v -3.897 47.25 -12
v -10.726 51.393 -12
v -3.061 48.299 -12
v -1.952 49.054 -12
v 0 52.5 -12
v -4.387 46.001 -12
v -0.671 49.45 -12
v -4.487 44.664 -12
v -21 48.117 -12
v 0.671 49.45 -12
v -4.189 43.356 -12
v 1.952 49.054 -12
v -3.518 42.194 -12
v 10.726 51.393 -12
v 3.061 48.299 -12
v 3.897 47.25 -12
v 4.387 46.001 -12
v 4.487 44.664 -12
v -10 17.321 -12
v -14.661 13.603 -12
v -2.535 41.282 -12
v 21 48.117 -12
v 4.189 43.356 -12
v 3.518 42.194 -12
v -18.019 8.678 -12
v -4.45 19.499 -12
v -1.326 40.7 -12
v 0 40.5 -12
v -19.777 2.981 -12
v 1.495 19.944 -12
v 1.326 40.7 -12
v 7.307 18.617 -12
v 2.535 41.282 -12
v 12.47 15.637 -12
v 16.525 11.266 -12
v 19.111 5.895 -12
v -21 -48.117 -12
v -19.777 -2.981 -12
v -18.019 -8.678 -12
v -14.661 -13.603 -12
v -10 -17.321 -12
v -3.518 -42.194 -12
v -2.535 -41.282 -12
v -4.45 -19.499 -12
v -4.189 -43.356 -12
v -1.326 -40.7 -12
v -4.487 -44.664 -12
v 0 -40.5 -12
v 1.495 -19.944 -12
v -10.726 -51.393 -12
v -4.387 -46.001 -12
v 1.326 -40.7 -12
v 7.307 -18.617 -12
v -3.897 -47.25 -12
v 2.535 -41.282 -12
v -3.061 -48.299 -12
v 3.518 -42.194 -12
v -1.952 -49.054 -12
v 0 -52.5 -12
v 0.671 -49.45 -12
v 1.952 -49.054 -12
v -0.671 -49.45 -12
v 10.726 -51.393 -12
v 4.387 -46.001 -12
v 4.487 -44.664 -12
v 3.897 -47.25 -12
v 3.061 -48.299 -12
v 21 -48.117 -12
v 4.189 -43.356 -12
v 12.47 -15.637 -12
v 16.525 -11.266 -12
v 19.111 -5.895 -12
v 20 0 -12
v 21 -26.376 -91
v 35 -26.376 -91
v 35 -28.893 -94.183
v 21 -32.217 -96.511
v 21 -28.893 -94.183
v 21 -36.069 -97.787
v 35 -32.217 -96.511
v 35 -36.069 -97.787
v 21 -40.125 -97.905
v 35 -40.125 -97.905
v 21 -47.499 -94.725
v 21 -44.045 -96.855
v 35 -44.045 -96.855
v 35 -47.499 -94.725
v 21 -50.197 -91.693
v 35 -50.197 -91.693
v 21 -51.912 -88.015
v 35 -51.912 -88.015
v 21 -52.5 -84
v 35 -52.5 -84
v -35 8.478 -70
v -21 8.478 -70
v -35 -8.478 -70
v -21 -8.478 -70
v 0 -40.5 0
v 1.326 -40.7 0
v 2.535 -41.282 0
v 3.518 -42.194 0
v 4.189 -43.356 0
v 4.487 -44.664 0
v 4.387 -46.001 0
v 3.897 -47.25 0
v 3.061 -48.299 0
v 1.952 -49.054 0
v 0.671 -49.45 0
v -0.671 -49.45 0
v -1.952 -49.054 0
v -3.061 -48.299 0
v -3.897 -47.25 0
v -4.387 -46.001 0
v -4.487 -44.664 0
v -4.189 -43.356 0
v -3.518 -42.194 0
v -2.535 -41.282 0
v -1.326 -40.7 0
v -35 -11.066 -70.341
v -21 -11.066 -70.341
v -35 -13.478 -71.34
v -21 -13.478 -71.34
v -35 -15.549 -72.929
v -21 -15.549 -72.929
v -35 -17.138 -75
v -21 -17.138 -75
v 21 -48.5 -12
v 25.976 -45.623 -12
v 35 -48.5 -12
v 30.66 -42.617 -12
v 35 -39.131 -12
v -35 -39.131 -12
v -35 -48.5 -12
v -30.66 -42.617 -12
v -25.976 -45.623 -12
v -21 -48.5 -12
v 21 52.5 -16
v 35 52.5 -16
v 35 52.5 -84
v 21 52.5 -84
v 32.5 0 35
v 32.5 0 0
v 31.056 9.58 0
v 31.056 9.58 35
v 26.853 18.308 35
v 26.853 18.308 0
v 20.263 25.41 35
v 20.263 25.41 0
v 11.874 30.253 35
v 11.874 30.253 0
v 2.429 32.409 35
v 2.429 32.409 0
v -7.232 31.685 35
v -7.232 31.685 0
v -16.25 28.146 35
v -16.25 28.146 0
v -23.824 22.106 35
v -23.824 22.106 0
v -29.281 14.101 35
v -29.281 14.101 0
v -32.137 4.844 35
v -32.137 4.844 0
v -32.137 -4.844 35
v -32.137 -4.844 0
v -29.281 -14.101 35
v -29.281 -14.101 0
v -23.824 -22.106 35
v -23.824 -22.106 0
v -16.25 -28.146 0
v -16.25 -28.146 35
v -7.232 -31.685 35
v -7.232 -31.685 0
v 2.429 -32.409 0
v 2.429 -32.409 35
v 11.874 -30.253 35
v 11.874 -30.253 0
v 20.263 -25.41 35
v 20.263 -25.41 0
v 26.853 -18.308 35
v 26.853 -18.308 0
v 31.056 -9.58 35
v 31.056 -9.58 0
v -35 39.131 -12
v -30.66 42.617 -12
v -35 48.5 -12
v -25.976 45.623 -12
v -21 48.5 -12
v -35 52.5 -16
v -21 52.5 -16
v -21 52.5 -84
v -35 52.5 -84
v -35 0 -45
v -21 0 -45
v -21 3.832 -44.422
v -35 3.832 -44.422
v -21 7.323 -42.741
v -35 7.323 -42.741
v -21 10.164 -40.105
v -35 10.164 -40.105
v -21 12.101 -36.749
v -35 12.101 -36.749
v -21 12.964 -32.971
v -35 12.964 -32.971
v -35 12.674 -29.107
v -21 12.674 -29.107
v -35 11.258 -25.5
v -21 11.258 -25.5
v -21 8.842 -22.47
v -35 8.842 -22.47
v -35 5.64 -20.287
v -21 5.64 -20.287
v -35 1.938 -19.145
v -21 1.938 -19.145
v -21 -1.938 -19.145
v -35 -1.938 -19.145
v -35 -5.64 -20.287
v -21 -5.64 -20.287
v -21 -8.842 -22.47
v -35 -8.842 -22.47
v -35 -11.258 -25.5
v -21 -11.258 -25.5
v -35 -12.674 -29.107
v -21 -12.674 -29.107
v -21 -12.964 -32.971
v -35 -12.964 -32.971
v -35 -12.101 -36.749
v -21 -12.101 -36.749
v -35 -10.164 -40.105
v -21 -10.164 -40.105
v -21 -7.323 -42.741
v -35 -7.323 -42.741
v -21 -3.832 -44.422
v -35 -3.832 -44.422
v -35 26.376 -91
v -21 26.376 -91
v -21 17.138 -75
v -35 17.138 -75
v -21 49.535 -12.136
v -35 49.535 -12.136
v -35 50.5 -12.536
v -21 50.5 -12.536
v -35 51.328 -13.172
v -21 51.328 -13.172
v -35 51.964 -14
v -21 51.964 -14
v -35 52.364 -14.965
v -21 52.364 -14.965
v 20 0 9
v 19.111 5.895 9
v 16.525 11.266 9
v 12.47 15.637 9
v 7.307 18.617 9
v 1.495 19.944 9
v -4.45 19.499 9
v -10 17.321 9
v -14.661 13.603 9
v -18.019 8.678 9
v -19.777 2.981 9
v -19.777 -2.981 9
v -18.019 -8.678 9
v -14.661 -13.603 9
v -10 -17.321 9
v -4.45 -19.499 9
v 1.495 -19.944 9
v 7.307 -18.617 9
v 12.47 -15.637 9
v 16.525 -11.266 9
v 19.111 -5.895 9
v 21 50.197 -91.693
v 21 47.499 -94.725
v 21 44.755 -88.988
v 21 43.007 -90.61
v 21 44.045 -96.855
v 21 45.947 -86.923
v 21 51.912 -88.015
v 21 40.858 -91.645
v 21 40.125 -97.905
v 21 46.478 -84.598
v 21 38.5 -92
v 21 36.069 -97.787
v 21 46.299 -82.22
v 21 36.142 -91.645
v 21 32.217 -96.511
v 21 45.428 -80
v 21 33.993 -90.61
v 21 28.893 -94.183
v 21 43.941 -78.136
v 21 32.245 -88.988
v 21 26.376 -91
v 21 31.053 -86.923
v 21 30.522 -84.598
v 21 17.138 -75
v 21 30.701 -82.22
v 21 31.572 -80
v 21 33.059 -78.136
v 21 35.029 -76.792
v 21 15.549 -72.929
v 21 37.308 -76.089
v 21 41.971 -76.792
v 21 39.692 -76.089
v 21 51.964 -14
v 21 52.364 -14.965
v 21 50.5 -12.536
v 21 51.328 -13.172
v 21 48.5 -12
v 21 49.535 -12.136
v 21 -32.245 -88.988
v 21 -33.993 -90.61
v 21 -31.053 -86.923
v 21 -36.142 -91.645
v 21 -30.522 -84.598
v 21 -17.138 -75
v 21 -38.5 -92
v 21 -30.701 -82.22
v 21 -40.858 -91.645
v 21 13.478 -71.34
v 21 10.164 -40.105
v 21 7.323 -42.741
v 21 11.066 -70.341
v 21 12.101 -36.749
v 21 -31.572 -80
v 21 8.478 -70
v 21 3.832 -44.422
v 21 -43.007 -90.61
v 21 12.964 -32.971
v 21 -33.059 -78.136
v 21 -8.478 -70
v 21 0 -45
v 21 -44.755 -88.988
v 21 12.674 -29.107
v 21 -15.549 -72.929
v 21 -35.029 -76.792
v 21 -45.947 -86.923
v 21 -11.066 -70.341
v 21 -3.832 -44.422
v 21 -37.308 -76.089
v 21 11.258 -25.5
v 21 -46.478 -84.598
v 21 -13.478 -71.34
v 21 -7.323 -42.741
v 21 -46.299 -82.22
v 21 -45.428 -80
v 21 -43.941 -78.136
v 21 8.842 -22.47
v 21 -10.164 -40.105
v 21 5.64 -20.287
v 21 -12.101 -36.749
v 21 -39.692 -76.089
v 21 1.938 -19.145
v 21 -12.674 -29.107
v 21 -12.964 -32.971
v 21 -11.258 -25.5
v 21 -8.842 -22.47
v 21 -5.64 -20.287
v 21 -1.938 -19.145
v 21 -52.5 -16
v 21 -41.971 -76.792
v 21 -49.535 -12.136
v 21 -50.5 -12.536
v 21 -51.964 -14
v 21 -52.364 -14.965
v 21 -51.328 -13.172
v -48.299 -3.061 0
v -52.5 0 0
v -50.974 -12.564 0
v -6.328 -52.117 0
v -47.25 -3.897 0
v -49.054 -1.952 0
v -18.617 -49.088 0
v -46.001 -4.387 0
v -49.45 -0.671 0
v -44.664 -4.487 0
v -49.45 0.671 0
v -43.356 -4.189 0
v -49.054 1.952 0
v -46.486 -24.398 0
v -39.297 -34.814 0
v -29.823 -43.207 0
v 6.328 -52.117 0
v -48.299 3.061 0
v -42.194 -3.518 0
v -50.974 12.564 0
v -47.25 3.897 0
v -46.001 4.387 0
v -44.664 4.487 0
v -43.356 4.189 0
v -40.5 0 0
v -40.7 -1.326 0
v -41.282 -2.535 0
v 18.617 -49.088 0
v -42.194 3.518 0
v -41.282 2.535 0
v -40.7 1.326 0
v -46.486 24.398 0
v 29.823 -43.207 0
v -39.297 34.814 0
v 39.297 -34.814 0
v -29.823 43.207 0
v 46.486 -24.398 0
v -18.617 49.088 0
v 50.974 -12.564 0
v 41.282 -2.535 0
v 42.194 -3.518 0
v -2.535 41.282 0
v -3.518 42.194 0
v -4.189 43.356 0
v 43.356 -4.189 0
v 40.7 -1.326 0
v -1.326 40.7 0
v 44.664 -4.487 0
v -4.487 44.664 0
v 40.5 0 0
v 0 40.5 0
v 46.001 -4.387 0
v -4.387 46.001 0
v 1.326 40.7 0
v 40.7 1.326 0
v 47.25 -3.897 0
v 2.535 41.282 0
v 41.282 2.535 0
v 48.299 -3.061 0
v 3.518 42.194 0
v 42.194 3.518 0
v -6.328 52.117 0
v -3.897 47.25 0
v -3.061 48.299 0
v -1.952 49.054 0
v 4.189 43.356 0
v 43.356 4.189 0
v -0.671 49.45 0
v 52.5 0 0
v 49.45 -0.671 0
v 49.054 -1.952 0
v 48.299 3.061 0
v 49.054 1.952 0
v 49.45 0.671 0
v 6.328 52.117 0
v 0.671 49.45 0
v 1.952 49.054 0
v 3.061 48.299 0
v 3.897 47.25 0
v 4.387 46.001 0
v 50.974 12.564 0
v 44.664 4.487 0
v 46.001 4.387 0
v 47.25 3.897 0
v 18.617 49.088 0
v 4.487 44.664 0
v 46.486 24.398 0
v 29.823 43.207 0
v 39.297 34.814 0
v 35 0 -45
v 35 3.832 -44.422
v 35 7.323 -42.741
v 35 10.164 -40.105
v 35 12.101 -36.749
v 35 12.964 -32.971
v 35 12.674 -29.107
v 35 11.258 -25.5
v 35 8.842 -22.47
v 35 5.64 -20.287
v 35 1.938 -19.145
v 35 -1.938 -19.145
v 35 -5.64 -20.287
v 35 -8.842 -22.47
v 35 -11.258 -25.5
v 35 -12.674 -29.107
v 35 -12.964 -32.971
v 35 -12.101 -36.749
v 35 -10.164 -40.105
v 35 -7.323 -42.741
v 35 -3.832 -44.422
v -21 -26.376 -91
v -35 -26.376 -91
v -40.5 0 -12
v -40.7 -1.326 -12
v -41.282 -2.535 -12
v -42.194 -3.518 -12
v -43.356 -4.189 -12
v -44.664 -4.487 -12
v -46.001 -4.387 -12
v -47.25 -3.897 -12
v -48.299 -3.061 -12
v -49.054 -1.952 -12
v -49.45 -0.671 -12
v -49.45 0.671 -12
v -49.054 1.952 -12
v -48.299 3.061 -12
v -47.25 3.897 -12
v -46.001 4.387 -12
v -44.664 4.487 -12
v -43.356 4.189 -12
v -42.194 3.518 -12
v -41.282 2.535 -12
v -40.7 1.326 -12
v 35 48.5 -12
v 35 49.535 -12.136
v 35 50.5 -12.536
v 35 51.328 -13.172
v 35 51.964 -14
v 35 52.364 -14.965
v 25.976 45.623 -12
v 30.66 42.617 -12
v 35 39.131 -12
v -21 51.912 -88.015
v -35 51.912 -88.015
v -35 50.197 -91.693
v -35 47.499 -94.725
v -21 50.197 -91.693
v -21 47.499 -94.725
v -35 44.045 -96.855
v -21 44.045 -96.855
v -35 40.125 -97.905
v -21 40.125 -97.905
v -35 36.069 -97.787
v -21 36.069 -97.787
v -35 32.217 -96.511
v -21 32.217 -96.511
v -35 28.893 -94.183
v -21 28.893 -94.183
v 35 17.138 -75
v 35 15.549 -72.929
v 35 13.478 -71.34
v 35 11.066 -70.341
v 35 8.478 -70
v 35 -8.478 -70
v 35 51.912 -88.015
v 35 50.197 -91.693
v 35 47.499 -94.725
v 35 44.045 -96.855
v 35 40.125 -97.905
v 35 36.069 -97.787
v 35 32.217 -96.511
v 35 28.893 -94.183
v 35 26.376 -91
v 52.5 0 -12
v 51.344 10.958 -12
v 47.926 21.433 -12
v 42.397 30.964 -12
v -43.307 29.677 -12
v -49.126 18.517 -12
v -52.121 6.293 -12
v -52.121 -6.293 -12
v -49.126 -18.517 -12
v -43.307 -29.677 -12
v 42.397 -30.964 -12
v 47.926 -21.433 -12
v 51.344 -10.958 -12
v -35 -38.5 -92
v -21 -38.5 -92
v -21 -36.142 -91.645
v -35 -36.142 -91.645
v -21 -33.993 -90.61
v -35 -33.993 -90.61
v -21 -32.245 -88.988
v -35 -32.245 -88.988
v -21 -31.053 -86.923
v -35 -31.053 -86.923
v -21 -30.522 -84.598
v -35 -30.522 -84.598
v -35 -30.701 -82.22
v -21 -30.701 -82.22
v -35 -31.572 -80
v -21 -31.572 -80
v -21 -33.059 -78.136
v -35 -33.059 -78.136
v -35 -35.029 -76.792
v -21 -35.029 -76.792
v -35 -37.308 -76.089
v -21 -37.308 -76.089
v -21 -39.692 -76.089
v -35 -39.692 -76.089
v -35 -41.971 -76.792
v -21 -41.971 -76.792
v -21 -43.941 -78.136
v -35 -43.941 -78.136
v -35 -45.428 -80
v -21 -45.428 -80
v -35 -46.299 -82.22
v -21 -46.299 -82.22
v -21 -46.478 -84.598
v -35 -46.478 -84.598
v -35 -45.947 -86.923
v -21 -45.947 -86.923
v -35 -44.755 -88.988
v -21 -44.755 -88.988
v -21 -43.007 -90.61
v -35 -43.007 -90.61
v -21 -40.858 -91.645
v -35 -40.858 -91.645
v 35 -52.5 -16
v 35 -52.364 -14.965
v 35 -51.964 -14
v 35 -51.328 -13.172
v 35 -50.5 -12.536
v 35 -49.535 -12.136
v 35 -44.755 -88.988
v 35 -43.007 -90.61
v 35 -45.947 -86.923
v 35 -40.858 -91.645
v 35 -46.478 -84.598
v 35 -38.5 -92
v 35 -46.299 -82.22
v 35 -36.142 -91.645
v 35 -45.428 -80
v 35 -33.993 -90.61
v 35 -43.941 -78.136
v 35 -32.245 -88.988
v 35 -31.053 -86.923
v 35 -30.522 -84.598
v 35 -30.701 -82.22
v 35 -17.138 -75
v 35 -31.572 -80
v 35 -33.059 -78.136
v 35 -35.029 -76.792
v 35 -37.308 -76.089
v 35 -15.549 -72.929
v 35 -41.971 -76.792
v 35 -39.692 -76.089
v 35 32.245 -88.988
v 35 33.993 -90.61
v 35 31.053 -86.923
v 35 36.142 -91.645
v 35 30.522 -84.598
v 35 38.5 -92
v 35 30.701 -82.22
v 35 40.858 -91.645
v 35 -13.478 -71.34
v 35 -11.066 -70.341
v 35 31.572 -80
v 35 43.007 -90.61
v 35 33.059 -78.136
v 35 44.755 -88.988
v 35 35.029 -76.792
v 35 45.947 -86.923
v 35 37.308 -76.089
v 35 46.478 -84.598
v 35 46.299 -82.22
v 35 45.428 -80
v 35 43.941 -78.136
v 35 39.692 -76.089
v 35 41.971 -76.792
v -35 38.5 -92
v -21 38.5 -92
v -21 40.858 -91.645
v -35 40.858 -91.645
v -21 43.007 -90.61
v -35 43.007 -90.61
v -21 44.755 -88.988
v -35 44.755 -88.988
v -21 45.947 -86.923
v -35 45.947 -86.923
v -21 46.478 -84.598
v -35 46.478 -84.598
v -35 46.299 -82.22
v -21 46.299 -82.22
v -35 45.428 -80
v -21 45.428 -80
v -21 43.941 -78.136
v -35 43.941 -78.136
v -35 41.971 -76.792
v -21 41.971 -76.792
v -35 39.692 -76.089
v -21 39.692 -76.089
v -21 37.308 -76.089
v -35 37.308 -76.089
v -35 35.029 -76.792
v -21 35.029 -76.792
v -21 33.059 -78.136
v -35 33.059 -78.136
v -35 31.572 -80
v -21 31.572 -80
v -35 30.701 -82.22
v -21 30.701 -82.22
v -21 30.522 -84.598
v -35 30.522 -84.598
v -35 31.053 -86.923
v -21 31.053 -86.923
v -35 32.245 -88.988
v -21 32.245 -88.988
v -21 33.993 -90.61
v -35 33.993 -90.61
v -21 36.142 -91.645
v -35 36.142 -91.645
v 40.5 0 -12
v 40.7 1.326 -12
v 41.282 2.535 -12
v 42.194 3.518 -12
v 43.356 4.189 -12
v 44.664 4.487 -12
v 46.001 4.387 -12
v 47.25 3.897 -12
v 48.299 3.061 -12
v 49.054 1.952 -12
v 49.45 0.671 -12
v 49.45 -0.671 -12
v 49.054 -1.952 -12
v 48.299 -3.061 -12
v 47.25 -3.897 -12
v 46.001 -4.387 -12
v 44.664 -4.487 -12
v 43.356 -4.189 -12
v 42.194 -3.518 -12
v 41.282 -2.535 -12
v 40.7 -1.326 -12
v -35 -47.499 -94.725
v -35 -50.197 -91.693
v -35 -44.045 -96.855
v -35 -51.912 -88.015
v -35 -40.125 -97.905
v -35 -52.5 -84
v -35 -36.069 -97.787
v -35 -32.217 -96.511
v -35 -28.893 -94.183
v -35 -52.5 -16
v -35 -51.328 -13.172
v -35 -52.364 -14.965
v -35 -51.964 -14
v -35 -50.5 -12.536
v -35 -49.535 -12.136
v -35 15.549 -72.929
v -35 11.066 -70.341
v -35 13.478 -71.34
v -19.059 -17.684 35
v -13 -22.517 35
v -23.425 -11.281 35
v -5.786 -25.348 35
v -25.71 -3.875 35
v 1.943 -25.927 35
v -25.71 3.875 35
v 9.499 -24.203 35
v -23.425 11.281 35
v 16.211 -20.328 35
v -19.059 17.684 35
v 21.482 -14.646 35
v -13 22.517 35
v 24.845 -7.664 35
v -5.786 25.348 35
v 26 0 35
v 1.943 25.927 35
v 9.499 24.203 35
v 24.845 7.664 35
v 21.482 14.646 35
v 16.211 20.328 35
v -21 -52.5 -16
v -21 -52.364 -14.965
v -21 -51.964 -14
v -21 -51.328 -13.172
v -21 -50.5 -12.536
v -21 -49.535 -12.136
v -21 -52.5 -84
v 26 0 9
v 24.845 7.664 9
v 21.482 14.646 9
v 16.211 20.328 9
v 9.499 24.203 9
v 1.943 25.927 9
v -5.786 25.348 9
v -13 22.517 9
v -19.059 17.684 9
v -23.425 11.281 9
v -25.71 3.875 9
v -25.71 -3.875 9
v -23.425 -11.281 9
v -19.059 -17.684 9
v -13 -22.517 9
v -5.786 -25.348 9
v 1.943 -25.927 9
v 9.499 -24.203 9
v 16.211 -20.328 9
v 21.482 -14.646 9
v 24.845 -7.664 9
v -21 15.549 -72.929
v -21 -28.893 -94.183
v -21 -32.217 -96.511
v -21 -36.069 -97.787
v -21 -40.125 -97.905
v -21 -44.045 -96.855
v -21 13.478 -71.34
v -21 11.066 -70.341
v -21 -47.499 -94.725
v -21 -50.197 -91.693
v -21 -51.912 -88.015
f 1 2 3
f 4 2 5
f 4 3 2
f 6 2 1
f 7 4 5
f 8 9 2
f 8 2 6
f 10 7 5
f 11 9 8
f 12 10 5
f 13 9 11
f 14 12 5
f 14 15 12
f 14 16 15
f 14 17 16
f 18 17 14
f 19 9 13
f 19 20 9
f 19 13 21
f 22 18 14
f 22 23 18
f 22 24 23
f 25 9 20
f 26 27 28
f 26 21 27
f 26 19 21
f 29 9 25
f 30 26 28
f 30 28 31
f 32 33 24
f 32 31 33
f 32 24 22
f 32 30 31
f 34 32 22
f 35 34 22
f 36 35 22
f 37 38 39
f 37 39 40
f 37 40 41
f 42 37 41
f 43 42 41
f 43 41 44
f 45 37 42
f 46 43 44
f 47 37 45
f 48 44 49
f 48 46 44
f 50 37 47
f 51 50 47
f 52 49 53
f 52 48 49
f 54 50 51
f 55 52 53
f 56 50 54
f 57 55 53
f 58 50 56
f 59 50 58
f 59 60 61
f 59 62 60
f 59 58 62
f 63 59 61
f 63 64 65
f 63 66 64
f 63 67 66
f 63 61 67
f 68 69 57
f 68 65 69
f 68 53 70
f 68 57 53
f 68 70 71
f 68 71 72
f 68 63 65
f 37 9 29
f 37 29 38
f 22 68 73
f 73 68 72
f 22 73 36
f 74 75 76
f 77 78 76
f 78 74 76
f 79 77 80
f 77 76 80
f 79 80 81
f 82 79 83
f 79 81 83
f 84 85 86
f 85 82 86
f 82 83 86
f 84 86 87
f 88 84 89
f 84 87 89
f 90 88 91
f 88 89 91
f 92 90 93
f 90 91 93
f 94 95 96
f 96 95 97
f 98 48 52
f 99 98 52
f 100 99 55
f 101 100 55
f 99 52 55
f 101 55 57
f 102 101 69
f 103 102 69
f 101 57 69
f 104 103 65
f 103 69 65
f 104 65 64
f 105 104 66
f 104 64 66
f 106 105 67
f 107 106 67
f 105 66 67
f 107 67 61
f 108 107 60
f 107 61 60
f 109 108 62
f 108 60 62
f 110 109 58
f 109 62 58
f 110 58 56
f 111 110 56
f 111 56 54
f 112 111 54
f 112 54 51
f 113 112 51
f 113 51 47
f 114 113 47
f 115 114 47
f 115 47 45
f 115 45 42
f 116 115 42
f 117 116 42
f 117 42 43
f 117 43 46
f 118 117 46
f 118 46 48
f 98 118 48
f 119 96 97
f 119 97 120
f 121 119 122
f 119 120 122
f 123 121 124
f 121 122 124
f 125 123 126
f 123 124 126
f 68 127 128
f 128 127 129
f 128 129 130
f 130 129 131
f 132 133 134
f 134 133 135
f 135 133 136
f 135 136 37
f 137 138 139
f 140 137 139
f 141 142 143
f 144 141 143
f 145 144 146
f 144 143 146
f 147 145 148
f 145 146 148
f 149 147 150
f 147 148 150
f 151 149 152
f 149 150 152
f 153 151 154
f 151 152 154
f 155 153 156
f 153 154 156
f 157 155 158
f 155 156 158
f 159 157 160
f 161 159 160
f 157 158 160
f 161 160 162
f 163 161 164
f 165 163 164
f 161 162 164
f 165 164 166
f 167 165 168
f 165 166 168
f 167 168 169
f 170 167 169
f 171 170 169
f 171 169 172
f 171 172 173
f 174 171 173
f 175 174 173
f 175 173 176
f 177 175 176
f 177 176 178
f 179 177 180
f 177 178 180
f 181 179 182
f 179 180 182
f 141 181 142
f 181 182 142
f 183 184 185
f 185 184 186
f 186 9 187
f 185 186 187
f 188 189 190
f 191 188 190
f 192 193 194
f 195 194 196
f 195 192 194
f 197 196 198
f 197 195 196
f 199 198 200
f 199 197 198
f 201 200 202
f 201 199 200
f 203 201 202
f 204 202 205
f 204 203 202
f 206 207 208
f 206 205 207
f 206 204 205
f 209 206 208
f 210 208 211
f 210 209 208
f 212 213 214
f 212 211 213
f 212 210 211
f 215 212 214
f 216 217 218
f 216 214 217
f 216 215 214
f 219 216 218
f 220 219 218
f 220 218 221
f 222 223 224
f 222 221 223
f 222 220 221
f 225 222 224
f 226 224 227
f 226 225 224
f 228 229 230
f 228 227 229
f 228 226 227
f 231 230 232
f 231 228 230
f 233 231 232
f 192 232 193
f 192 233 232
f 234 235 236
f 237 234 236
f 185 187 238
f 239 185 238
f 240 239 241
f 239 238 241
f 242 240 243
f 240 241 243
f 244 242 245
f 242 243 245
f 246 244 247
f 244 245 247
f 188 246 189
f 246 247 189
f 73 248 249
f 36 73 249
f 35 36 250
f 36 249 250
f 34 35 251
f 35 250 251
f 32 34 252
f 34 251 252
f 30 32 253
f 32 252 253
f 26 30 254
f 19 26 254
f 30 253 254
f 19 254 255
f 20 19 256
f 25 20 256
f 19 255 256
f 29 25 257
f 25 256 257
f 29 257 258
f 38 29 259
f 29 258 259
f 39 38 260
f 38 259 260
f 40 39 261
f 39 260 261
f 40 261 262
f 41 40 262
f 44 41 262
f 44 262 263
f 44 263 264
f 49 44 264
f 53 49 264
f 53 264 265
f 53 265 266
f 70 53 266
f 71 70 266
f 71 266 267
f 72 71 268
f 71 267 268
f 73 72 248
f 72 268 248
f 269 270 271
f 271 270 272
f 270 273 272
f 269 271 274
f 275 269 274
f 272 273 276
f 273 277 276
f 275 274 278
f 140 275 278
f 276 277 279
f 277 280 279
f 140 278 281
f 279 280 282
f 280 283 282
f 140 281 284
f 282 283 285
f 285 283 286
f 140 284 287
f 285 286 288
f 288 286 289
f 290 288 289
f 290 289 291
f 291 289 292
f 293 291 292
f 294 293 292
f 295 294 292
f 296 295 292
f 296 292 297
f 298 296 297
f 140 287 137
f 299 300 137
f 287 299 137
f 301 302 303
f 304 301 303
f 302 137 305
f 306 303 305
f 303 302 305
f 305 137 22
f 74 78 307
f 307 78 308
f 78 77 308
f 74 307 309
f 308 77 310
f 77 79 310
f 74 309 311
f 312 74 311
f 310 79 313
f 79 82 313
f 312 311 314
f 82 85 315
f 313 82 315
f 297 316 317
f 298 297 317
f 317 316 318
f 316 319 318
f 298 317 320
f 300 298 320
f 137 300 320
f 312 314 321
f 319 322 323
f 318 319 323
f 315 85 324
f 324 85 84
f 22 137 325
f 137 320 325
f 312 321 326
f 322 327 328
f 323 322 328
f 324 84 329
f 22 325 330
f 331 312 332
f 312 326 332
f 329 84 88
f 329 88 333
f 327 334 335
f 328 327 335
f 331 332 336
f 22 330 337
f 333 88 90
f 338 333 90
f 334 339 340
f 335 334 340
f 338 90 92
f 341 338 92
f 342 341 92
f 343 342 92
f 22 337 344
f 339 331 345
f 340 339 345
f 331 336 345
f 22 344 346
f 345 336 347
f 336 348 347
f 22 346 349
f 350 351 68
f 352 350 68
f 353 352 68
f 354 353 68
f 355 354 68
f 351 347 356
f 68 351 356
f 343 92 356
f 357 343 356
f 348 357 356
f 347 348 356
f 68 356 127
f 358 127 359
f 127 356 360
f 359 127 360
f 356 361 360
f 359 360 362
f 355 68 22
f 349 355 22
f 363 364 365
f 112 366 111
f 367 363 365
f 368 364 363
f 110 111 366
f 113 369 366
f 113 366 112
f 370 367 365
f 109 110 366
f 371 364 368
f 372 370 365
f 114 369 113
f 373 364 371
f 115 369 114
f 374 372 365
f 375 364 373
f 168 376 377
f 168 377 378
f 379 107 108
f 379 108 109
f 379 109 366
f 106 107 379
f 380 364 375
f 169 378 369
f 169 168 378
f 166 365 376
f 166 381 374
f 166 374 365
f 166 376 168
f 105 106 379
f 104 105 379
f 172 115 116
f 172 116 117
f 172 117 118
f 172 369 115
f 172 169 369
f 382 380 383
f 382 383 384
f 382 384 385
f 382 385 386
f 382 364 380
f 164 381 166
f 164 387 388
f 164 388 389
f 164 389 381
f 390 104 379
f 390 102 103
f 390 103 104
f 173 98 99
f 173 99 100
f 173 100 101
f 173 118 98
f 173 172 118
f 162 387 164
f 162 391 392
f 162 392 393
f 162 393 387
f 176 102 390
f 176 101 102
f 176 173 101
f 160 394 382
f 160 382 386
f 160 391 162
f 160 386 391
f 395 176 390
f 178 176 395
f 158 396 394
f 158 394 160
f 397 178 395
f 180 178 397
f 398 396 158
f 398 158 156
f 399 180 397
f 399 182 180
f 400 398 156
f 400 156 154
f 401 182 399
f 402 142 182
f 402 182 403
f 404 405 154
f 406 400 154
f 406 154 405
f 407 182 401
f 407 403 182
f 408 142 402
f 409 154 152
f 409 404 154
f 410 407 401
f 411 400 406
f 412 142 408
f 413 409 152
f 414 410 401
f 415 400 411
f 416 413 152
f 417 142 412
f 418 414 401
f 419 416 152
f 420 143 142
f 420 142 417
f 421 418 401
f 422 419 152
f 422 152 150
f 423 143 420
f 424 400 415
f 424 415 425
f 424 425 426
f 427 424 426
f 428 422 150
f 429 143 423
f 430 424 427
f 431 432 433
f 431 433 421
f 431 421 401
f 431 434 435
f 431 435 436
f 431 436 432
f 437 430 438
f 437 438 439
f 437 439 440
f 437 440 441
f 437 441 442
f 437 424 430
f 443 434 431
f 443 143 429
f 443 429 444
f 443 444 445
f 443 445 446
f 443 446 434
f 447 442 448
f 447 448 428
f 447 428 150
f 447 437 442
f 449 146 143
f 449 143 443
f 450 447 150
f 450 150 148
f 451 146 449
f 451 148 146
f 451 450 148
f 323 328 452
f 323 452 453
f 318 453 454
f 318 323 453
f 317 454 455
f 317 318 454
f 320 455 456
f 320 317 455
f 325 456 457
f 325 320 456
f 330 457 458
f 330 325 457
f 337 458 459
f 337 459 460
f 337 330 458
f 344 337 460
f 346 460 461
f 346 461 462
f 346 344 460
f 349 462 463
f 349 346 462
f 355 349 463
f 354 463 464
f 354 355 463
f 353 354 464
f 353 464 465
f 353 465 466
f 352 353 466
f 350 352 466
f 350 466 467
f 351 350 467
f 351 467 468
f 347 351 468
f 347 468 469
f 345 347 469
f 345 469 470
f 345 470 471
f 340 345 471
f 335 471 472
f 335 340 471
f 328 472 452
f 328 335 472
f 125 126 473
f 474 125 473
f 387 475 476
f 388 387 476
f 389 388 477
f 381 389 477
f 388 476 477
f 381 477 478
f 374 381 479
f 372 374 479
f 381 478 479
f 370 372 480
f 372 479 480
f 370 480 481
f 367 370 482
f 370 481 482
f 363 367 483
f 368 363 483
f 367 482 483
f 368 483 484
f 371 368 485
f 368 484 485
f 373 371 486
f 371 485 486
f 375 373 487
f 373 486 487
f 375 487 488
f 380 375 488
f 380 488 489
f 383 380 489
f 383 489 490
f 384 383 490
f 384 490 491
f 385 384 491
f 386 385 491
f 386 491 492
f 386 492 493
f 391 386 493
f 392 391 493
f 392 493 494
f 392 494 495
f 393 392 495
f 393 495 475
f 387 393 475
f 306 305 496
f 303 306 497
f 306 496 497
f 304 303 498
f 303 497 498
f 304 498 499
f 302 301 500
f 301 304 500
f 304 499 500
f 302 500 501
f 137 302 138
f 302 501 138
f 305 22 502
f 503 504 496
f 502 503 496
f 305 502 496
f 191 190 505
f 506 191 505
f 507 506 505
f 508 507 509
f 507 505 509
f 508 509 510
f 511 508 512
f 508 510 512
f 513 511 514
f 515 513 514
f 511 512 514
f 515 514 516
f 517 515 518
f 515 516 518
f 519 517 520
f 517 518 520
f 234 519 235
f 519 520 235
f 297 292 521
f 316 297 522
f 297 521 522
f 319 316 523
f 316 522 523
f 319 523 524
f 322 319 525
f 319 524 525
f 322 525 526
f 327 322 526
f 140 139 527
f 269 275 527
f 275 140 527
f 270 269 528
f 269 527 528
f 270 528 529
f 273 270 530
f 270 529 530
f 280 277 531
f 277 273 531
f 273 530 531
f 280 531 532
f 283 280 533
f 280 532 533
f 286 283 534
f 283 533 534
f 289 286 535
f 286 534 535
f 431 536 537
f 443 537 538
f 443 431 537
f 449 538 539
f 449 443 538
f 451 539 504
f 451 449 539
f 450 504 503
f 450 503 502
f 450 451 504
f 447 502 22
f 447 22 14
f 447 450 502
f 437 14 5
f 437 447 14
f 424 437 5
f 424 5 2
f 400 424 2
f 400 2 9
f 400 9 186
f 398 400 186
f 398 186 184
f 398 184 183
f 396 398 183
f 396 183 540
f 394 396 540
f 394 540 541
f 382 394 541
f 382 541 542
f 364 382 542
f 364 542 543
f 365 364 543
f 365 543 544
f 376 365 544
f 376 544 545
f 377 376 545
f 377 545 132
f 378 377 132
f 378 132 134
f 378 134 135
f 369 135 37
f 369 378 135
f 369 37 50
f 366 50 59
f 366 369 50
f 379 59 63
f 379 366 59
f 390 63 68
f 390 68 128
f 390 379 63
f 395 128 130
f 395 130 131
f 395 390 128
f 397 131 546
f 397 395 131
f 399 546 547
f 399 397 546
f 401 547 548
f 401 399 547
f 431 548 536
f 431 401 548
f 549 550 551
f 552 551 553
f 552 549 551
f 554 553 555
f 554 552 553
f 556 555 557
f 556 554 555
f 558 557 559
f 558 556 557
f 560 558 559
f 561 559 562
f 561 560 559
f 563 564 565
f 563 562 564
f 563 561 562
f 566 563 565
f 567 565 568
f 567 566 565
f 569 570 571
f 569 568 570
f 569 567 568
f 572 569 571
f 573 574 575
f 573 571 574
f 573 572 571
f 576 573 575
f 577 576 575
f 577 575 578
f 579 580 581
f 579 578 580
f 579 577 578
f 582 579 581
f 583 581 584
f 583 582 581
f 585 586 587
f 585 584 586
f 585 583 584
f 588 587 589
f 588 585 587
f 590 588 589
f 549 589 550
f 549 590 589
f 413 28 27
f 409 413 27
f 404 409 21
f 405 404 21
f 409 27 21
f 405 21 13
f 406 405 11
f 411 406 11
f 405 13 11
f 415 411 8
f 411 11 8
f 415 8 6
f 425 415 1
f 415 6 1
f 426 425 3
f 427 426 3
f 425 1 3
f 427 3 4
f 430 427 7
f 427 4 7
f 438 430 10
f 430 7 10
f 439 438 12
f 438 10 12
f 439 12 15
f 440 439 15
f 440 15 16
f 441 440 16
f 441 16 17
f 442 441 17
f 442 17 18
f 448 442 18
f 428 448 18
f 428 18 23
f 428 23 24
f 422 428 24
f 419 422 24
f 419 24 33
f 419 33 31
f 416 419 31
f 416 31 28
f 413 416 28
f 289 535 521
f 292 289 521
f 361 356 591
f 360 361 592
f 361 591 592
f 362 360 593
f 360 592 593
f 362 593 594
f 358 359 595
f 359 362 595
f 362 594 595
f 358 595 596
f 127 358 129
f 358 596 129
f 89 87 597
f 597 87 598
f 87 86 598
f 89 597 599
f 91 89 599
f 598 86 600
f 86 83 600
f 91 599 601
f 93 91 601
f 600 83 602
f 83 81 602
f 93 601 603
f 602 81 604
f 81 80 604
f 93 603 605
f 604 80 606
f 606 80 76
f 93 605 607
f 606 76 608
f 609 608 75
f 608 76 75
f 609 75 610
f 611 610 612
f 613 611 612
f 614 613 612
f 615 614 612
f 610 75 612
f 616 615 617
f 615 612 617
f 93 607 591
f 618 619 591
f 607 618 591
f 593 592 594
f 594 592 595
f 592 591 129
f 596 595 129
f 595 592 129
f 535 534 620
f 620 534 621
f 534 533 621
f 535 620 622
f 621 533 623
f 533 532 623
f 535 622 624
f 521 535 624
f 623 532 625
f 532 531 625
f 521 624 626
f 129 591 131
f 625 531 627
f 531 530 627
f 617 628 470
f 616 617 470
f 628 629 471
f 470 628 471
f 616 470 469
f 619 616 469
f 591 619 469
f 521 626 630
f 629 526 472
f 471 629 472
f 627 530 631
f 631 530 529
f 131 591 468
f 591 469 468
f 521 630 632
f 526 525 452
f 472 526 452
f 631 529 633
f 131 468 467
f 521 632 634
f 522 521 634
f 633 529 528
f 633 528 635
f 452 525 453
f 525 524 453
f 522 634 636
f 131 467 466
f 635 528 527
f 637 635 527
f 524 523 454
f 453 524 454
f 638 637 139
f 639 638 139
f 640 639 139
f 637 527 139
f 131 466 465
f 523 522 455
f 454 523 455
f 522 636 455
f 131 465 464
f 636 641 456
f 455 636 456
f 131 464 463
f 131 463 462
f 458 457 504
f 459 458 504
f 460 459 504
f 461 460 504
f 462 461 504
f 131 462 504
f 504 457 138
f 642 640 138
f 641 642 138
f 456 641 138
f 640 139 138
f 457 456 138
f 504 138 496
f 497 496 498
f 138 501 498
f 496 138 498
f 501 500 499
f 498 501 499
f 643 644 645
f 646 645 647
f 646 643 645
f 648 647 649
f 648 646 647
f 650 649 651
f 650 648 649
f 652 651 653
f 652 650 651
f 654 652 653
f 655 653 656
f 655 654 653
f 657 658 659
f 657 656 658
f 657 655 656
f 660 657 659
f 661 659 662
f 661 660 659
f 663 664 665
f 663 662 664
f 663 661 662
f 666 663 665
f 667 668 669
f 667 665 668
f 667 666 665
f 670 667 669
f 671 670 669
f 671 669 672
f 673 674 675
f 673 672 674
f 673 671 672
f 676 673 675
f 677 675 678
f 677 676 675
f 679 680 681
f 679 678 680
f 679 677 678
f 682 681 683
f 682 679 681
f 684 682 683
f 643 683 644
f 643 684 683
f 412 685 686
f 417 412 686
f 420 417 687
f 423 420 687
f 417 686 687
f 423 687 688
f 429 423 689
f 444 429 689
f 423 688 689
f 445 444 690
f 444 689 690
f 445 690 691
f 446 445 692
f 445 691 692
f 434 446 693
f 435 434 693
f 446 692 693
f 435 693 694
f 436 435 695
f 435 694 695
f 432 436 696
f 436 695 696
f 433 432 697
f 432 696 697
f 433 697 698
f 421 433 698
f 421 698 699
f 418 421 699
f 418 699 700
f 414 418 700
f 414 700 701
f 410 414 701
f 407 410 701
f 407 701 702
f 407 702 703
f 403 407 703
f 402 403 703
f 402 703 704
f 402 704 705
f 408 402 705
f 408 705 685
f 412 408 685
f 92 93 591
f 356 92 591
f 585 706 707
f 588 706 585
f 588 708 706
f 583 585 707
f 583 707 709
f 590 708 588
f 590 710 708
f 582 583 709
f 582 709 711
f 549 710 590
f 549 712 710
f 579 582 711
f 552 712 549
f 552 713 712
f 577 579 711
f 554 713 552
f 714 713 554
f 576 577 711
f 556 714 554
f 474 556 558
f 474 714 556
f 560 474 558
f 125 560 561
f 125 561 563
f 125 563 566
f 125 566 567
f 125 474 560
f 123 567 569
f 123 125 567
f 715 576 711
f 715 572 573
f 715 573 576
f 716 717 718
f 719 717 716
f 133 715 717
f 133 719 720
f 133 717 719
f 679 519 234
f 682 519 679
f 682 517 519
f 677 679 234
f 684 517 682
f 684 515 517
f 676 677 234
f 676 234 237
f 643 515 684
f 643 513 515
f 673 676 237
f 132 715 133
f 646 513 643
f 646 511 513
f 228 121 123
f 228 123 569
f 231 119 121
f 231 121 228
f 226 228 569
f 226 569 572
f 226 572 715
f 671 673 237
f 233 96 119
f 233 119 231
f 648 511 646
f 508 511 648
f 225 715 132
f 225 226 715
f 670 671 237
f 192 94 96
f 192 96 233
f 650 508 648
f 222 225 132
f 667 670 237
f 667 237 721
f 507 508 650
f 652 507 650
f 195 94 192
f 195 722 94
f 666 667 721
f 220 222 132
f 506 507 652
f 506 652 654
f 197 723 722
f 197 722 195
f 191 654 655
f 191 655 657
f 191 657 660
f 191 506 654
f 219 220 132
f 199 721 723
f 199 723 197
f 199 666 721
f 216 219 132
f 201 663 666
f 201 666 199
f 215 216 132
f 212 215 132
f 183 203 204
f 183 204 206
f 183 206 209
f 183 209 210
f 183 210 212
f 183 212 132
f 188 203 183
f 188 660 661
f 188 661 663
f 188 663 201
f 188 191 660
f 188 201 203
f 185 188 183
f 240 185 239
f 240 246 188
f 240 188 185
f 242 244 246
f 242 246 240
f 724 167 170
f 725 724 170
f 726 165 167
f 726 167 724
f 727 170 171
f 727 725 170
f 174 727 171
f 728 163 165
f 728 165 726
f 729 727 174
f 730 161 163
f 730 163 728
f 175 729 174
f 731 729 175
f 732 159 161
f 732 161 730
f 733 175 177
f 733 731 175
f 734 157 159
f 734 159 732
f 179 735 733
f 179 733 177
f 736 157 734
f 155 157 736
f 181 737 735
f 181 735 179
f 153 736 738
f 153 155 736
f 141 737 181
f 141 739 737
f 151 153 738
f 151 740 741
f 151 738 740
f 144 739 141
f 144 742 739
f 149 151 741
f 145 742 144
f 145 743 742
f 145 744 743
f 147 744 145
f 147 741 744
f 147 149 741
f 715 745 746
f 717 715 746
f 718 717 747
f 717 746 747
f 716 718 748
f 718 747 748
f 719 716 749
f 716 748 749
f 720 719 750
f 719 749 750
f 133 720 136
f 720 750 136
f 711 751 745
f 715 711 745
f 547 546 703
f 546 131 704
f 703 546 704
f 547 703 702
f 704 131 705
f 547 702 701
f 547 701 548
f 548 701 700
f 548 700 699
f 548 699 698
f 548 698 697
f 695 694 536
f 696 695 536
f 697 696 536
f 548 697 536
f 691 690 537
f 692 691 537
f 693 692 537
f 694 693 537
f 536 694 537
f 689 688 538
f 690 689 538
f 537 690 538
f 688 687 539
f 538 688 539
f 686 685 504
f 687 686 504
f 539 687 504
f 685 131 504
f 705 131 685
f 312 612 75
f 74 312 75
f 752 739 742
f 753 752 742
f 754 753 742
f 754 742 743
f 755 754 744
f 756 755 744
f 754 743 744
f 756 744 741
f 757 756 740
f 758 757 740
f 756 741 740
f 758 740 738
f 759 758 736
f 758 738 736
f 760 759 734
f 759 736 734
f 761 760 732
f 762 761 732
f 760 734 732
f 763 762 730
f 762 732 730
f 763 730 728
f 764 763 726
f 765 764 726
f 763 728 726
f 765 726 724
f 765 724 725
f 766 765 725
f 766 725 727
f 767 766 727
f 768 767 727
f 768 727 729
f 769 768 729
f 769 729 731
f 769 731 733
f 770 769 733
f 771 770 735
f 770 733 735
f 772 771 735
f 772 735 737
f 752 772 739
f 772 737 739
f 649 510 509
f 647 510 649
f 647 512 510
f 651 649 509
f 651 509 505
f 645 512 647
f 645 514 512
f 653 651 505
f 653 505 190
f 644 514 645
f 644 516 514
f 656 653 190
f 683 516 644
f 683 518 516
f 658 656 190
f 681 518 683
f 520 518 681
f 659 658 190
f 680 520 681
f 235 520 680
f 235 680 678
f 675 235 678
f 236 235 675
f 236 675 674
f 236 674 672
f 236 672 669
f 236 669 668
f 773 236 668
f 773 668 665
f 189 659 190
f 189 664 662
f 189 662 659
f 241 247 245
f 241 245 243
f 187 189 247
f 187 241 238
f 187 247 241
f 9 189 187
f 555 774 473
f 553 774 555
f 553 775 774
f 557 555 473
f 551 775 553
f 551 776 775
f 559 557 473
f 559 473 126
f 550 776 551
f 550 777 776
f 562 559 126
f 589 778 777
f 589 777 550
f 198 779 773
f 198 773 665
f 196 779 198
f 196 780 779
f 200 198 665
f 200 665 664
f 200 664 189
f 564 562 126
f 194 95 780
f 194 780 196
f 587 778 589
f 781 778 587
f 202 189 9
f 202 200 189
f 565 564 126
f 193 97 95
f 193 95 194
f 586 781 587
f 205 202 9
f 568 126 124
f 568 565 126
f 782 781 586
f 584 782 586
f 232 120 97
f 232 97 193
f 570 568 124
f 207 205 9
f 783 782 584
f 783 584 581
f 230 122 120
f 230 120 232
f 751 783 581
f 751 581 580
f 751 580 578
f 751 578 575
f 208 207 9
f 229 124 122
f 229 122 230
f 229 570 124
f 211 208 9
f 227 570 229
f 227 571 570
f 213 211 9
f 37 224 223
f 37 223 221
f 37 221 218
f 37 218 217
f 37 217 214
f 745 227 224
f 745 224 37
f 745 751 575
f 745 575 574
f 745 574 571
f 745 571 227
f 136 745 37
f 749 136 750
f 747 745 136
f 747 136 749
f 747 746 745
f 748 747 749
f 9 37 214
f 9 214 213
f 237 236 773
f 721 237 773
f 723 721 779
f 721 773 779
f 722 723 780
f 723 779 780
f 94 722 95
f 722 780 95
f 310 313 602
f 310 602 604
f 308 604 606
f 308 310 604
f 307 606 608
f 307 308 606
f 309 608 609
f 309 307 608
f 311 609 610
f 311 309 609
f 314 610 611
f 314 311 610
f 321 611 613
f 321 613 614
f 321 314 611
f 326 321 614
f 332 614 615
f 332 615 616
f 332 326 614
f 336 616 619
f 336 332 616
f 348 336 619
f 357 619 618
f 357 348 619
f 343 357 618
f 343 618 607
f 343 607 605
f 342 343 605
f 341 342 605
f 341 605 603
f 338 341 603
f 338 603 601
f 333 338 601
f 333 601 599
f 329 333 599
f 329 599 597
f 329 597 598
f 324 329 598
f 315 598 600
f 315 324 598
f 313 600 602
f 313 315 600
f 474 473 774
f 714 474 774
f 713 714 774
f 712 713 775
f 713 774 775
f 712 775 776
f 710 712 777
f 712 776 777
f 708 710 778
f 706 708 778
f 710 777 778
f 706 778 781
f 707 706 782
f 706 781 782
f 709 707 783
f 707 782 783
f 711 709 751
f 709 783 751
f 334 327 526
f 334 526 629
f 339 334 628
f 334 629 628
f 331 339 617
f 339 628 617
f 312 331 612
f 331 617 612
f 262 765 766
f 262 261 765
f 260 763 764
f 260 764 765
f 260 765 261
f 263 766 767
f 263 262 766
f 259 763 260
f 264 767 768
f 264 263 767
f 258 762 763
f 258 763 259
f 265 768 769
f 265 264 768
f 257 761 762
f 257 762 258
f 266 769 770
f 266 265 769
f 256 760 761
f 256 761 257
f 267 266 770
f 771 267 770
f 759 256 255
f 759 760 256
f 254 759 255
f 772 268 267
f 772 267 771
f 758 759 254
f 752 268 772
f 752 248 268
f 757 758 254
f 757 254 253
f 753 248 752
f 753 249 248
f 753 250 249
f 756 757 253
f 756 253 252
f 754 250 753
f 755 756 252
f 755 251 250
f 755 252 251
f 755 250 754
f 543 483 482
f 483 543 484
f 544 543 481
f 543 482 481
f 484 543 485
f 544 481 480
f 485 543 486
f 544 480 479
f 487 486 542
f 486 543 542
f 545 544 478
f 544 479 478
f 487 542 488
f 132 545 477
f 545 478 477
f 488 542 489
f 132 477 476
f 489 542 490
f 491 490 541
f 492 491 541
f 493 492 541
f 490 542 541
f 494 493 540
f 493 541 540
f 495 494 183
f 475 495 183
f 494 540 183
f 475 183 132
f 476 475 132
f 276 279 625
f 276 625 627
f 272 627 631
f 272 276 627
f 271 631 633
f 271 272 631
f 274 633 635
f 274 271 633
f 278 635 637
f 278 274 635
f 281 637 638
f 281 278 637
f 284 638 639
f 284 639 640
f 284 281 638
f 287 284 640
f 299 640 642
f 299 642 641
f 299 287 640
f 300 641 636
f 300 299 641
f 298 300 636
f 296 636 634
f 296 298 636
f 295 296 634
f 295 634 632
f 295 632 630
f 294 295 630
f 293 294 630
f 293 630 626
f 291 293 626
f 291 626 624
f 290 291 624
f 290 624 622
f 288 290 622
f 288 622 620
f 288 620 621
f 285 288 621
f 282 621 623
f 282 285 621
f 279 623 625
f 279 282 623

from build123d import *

# Parameters (mm, degrees)
SKETCH_1_R               = 52.5
EXTRUDE_1_DEPTH          = 12
SKETCH_2_R               = 32.5
EXTRUDE_2_DEPTH          = 35
SKETCH_3_R               = 26
CUT_EXTRUDE_1_DEPTH      = 26
SKETCH_4_R               = 20
CUT_EXTRUDE_2_DEPTH      = 21
SKETCH_5_R               = 8
SKETCH_5_R_2             = 13
EXTRUDE_3_DEPTH          = 35
SKETCH_6_W               = 42
SKETCH_6_H               = 101.243911614
CUT_EXTRUDE_3_DEPTH      = 153.922365925
SKETCH_7_R               = 4.5
CUT_EXTRUDE_4_DEPTH      = 114.615579918
PATTERN_CIRCULAR_1_COUNT = 4


with BuildPart() as part:
    # 草图1 → 凸台-拉伸1 (new body)
    with BuildSketch(Plane.XY):
        Circle(SKETCH_1_R)
    extrude(amount=-EXTRUDE_1_DEPTH)

    # 草图2 → 凸台-拉伸2 (add)
    with BuildSketch(Plane.XY):
        Circle(SKETCH_2_R)
    extrude(amount=EXTRUDE_2_DEPTH)

    # 草图3 → 切除-拉伸1 (cut)
    with BuildSketch(Plane.XY.offset(35)):
        Circle(SKETCH_3_R)
    extrude(amount=-CUT_EXTRUDE_1_DEPTH, mode=Mode.SUBTRACT)

    # 草图4 → 切除-拉伸2 (cut)
    with BuildSketch(Plane.XY.offset(9)):
        Circle(SKETCH_4_R)
    extrude(amount=-CUT_EXTRUDE_2_DEPTH, mode=Mode.SUBTRACT)

    # 草图5 → 凸台-拉伸3 (add, symmetric)
    with BuildSketch(Plane(origin=(0, 0, 0), x_dir=(0, 0, -1), z_dir=(1, 0, 0))):
        with BuildLine():
            Line((84, -52.5), (16, -52.5))
            ThreePointArc((16, -52.5), (13.171572875, -51.328427125), (12, -48.5))
            Line((12, -48.5), (12, 48.5))
            ThreePointArc((12, 48.5), (13.171572875, 51.328427125), (16, 52.5))
            Line((16, 52.5), (84, 52.5))
            ThreePointArc((84, 52.5), (97.522961568, 42.123466631), (91, 26.375644347))
            Line((91, 26.375644347), (75, 17.13804004))
            ThreePointArc((75, 17.13804004), (71.339745962, 13.477786002), (70, 8.477786002))
            Line((70, 8.477786002), (70, -8.477786002))
            ThreePointArc((70, -8.477786002), (71.339745962, -13.477786002), (75, -17.13804004))
            Line((75, -17.13804004), (91, -26.375644347))
            ThreePointArc((91, -26.375644347), (97.522961568, -42.123466631), (84, -52.5))
        make_face()
        with Locations((84, 38.5)):
            Circle(SKETCH_5_R, mode=Mode.SUBTRACT)
        with Locations((84, -38.5)):
            Circle(SKETCH_5_R, mode=Mode.SUBTRACT)
        with Locations((32, 0)):
            Circle(SKETCH_5_R_2, mode=Mode.SUBTRACT)
    extrude(amount=EXTRUDE_3_DEPTH, both=True)

    # 草图6 → 切除-拉伸3 (cut, through all)
    with BuildSketch(Plane.XZ.offset(52.5)):
        with Locations((0, -62.621955807)):
            Rectangle(SKETCH_6_W, SKETCH_6_H)
    extrude(amount=-CUT_EXTRUDE_3_DEPTH, mode=Mode.SUBTRACT)

    # 草图7 → 切除-拉伸4 (cut, through all)
    with BuildSketch(Plane(origin=(0, 0, -12), x_dir=(-1, 0, 0), z_dir=(0, 0, -1))):
        with Locations((-45, 0)):
            Circle(SKETCH_7_R)
    cut_extrude_4 = extrude(amount=-CUT_EXTRUDE_4_DEPTH, mode=Mode.SUBTRACT)

    # 阵列(圆周)1: 切除-拉伸4 ×4 about axis
    pattern_circular_1_axis = Axis((0, 0, 0), (0, 0, 1))
    for i in range(1, PATTERN_CIRCULAR_1_COUNT):
        add(cut_extrude_4.rotate(pattern_circular_1_axis, i * 360 / PATTERN_CIRCULAR_1_COUNT), mode=Mode.SUBTRACT)


solid = part.part
